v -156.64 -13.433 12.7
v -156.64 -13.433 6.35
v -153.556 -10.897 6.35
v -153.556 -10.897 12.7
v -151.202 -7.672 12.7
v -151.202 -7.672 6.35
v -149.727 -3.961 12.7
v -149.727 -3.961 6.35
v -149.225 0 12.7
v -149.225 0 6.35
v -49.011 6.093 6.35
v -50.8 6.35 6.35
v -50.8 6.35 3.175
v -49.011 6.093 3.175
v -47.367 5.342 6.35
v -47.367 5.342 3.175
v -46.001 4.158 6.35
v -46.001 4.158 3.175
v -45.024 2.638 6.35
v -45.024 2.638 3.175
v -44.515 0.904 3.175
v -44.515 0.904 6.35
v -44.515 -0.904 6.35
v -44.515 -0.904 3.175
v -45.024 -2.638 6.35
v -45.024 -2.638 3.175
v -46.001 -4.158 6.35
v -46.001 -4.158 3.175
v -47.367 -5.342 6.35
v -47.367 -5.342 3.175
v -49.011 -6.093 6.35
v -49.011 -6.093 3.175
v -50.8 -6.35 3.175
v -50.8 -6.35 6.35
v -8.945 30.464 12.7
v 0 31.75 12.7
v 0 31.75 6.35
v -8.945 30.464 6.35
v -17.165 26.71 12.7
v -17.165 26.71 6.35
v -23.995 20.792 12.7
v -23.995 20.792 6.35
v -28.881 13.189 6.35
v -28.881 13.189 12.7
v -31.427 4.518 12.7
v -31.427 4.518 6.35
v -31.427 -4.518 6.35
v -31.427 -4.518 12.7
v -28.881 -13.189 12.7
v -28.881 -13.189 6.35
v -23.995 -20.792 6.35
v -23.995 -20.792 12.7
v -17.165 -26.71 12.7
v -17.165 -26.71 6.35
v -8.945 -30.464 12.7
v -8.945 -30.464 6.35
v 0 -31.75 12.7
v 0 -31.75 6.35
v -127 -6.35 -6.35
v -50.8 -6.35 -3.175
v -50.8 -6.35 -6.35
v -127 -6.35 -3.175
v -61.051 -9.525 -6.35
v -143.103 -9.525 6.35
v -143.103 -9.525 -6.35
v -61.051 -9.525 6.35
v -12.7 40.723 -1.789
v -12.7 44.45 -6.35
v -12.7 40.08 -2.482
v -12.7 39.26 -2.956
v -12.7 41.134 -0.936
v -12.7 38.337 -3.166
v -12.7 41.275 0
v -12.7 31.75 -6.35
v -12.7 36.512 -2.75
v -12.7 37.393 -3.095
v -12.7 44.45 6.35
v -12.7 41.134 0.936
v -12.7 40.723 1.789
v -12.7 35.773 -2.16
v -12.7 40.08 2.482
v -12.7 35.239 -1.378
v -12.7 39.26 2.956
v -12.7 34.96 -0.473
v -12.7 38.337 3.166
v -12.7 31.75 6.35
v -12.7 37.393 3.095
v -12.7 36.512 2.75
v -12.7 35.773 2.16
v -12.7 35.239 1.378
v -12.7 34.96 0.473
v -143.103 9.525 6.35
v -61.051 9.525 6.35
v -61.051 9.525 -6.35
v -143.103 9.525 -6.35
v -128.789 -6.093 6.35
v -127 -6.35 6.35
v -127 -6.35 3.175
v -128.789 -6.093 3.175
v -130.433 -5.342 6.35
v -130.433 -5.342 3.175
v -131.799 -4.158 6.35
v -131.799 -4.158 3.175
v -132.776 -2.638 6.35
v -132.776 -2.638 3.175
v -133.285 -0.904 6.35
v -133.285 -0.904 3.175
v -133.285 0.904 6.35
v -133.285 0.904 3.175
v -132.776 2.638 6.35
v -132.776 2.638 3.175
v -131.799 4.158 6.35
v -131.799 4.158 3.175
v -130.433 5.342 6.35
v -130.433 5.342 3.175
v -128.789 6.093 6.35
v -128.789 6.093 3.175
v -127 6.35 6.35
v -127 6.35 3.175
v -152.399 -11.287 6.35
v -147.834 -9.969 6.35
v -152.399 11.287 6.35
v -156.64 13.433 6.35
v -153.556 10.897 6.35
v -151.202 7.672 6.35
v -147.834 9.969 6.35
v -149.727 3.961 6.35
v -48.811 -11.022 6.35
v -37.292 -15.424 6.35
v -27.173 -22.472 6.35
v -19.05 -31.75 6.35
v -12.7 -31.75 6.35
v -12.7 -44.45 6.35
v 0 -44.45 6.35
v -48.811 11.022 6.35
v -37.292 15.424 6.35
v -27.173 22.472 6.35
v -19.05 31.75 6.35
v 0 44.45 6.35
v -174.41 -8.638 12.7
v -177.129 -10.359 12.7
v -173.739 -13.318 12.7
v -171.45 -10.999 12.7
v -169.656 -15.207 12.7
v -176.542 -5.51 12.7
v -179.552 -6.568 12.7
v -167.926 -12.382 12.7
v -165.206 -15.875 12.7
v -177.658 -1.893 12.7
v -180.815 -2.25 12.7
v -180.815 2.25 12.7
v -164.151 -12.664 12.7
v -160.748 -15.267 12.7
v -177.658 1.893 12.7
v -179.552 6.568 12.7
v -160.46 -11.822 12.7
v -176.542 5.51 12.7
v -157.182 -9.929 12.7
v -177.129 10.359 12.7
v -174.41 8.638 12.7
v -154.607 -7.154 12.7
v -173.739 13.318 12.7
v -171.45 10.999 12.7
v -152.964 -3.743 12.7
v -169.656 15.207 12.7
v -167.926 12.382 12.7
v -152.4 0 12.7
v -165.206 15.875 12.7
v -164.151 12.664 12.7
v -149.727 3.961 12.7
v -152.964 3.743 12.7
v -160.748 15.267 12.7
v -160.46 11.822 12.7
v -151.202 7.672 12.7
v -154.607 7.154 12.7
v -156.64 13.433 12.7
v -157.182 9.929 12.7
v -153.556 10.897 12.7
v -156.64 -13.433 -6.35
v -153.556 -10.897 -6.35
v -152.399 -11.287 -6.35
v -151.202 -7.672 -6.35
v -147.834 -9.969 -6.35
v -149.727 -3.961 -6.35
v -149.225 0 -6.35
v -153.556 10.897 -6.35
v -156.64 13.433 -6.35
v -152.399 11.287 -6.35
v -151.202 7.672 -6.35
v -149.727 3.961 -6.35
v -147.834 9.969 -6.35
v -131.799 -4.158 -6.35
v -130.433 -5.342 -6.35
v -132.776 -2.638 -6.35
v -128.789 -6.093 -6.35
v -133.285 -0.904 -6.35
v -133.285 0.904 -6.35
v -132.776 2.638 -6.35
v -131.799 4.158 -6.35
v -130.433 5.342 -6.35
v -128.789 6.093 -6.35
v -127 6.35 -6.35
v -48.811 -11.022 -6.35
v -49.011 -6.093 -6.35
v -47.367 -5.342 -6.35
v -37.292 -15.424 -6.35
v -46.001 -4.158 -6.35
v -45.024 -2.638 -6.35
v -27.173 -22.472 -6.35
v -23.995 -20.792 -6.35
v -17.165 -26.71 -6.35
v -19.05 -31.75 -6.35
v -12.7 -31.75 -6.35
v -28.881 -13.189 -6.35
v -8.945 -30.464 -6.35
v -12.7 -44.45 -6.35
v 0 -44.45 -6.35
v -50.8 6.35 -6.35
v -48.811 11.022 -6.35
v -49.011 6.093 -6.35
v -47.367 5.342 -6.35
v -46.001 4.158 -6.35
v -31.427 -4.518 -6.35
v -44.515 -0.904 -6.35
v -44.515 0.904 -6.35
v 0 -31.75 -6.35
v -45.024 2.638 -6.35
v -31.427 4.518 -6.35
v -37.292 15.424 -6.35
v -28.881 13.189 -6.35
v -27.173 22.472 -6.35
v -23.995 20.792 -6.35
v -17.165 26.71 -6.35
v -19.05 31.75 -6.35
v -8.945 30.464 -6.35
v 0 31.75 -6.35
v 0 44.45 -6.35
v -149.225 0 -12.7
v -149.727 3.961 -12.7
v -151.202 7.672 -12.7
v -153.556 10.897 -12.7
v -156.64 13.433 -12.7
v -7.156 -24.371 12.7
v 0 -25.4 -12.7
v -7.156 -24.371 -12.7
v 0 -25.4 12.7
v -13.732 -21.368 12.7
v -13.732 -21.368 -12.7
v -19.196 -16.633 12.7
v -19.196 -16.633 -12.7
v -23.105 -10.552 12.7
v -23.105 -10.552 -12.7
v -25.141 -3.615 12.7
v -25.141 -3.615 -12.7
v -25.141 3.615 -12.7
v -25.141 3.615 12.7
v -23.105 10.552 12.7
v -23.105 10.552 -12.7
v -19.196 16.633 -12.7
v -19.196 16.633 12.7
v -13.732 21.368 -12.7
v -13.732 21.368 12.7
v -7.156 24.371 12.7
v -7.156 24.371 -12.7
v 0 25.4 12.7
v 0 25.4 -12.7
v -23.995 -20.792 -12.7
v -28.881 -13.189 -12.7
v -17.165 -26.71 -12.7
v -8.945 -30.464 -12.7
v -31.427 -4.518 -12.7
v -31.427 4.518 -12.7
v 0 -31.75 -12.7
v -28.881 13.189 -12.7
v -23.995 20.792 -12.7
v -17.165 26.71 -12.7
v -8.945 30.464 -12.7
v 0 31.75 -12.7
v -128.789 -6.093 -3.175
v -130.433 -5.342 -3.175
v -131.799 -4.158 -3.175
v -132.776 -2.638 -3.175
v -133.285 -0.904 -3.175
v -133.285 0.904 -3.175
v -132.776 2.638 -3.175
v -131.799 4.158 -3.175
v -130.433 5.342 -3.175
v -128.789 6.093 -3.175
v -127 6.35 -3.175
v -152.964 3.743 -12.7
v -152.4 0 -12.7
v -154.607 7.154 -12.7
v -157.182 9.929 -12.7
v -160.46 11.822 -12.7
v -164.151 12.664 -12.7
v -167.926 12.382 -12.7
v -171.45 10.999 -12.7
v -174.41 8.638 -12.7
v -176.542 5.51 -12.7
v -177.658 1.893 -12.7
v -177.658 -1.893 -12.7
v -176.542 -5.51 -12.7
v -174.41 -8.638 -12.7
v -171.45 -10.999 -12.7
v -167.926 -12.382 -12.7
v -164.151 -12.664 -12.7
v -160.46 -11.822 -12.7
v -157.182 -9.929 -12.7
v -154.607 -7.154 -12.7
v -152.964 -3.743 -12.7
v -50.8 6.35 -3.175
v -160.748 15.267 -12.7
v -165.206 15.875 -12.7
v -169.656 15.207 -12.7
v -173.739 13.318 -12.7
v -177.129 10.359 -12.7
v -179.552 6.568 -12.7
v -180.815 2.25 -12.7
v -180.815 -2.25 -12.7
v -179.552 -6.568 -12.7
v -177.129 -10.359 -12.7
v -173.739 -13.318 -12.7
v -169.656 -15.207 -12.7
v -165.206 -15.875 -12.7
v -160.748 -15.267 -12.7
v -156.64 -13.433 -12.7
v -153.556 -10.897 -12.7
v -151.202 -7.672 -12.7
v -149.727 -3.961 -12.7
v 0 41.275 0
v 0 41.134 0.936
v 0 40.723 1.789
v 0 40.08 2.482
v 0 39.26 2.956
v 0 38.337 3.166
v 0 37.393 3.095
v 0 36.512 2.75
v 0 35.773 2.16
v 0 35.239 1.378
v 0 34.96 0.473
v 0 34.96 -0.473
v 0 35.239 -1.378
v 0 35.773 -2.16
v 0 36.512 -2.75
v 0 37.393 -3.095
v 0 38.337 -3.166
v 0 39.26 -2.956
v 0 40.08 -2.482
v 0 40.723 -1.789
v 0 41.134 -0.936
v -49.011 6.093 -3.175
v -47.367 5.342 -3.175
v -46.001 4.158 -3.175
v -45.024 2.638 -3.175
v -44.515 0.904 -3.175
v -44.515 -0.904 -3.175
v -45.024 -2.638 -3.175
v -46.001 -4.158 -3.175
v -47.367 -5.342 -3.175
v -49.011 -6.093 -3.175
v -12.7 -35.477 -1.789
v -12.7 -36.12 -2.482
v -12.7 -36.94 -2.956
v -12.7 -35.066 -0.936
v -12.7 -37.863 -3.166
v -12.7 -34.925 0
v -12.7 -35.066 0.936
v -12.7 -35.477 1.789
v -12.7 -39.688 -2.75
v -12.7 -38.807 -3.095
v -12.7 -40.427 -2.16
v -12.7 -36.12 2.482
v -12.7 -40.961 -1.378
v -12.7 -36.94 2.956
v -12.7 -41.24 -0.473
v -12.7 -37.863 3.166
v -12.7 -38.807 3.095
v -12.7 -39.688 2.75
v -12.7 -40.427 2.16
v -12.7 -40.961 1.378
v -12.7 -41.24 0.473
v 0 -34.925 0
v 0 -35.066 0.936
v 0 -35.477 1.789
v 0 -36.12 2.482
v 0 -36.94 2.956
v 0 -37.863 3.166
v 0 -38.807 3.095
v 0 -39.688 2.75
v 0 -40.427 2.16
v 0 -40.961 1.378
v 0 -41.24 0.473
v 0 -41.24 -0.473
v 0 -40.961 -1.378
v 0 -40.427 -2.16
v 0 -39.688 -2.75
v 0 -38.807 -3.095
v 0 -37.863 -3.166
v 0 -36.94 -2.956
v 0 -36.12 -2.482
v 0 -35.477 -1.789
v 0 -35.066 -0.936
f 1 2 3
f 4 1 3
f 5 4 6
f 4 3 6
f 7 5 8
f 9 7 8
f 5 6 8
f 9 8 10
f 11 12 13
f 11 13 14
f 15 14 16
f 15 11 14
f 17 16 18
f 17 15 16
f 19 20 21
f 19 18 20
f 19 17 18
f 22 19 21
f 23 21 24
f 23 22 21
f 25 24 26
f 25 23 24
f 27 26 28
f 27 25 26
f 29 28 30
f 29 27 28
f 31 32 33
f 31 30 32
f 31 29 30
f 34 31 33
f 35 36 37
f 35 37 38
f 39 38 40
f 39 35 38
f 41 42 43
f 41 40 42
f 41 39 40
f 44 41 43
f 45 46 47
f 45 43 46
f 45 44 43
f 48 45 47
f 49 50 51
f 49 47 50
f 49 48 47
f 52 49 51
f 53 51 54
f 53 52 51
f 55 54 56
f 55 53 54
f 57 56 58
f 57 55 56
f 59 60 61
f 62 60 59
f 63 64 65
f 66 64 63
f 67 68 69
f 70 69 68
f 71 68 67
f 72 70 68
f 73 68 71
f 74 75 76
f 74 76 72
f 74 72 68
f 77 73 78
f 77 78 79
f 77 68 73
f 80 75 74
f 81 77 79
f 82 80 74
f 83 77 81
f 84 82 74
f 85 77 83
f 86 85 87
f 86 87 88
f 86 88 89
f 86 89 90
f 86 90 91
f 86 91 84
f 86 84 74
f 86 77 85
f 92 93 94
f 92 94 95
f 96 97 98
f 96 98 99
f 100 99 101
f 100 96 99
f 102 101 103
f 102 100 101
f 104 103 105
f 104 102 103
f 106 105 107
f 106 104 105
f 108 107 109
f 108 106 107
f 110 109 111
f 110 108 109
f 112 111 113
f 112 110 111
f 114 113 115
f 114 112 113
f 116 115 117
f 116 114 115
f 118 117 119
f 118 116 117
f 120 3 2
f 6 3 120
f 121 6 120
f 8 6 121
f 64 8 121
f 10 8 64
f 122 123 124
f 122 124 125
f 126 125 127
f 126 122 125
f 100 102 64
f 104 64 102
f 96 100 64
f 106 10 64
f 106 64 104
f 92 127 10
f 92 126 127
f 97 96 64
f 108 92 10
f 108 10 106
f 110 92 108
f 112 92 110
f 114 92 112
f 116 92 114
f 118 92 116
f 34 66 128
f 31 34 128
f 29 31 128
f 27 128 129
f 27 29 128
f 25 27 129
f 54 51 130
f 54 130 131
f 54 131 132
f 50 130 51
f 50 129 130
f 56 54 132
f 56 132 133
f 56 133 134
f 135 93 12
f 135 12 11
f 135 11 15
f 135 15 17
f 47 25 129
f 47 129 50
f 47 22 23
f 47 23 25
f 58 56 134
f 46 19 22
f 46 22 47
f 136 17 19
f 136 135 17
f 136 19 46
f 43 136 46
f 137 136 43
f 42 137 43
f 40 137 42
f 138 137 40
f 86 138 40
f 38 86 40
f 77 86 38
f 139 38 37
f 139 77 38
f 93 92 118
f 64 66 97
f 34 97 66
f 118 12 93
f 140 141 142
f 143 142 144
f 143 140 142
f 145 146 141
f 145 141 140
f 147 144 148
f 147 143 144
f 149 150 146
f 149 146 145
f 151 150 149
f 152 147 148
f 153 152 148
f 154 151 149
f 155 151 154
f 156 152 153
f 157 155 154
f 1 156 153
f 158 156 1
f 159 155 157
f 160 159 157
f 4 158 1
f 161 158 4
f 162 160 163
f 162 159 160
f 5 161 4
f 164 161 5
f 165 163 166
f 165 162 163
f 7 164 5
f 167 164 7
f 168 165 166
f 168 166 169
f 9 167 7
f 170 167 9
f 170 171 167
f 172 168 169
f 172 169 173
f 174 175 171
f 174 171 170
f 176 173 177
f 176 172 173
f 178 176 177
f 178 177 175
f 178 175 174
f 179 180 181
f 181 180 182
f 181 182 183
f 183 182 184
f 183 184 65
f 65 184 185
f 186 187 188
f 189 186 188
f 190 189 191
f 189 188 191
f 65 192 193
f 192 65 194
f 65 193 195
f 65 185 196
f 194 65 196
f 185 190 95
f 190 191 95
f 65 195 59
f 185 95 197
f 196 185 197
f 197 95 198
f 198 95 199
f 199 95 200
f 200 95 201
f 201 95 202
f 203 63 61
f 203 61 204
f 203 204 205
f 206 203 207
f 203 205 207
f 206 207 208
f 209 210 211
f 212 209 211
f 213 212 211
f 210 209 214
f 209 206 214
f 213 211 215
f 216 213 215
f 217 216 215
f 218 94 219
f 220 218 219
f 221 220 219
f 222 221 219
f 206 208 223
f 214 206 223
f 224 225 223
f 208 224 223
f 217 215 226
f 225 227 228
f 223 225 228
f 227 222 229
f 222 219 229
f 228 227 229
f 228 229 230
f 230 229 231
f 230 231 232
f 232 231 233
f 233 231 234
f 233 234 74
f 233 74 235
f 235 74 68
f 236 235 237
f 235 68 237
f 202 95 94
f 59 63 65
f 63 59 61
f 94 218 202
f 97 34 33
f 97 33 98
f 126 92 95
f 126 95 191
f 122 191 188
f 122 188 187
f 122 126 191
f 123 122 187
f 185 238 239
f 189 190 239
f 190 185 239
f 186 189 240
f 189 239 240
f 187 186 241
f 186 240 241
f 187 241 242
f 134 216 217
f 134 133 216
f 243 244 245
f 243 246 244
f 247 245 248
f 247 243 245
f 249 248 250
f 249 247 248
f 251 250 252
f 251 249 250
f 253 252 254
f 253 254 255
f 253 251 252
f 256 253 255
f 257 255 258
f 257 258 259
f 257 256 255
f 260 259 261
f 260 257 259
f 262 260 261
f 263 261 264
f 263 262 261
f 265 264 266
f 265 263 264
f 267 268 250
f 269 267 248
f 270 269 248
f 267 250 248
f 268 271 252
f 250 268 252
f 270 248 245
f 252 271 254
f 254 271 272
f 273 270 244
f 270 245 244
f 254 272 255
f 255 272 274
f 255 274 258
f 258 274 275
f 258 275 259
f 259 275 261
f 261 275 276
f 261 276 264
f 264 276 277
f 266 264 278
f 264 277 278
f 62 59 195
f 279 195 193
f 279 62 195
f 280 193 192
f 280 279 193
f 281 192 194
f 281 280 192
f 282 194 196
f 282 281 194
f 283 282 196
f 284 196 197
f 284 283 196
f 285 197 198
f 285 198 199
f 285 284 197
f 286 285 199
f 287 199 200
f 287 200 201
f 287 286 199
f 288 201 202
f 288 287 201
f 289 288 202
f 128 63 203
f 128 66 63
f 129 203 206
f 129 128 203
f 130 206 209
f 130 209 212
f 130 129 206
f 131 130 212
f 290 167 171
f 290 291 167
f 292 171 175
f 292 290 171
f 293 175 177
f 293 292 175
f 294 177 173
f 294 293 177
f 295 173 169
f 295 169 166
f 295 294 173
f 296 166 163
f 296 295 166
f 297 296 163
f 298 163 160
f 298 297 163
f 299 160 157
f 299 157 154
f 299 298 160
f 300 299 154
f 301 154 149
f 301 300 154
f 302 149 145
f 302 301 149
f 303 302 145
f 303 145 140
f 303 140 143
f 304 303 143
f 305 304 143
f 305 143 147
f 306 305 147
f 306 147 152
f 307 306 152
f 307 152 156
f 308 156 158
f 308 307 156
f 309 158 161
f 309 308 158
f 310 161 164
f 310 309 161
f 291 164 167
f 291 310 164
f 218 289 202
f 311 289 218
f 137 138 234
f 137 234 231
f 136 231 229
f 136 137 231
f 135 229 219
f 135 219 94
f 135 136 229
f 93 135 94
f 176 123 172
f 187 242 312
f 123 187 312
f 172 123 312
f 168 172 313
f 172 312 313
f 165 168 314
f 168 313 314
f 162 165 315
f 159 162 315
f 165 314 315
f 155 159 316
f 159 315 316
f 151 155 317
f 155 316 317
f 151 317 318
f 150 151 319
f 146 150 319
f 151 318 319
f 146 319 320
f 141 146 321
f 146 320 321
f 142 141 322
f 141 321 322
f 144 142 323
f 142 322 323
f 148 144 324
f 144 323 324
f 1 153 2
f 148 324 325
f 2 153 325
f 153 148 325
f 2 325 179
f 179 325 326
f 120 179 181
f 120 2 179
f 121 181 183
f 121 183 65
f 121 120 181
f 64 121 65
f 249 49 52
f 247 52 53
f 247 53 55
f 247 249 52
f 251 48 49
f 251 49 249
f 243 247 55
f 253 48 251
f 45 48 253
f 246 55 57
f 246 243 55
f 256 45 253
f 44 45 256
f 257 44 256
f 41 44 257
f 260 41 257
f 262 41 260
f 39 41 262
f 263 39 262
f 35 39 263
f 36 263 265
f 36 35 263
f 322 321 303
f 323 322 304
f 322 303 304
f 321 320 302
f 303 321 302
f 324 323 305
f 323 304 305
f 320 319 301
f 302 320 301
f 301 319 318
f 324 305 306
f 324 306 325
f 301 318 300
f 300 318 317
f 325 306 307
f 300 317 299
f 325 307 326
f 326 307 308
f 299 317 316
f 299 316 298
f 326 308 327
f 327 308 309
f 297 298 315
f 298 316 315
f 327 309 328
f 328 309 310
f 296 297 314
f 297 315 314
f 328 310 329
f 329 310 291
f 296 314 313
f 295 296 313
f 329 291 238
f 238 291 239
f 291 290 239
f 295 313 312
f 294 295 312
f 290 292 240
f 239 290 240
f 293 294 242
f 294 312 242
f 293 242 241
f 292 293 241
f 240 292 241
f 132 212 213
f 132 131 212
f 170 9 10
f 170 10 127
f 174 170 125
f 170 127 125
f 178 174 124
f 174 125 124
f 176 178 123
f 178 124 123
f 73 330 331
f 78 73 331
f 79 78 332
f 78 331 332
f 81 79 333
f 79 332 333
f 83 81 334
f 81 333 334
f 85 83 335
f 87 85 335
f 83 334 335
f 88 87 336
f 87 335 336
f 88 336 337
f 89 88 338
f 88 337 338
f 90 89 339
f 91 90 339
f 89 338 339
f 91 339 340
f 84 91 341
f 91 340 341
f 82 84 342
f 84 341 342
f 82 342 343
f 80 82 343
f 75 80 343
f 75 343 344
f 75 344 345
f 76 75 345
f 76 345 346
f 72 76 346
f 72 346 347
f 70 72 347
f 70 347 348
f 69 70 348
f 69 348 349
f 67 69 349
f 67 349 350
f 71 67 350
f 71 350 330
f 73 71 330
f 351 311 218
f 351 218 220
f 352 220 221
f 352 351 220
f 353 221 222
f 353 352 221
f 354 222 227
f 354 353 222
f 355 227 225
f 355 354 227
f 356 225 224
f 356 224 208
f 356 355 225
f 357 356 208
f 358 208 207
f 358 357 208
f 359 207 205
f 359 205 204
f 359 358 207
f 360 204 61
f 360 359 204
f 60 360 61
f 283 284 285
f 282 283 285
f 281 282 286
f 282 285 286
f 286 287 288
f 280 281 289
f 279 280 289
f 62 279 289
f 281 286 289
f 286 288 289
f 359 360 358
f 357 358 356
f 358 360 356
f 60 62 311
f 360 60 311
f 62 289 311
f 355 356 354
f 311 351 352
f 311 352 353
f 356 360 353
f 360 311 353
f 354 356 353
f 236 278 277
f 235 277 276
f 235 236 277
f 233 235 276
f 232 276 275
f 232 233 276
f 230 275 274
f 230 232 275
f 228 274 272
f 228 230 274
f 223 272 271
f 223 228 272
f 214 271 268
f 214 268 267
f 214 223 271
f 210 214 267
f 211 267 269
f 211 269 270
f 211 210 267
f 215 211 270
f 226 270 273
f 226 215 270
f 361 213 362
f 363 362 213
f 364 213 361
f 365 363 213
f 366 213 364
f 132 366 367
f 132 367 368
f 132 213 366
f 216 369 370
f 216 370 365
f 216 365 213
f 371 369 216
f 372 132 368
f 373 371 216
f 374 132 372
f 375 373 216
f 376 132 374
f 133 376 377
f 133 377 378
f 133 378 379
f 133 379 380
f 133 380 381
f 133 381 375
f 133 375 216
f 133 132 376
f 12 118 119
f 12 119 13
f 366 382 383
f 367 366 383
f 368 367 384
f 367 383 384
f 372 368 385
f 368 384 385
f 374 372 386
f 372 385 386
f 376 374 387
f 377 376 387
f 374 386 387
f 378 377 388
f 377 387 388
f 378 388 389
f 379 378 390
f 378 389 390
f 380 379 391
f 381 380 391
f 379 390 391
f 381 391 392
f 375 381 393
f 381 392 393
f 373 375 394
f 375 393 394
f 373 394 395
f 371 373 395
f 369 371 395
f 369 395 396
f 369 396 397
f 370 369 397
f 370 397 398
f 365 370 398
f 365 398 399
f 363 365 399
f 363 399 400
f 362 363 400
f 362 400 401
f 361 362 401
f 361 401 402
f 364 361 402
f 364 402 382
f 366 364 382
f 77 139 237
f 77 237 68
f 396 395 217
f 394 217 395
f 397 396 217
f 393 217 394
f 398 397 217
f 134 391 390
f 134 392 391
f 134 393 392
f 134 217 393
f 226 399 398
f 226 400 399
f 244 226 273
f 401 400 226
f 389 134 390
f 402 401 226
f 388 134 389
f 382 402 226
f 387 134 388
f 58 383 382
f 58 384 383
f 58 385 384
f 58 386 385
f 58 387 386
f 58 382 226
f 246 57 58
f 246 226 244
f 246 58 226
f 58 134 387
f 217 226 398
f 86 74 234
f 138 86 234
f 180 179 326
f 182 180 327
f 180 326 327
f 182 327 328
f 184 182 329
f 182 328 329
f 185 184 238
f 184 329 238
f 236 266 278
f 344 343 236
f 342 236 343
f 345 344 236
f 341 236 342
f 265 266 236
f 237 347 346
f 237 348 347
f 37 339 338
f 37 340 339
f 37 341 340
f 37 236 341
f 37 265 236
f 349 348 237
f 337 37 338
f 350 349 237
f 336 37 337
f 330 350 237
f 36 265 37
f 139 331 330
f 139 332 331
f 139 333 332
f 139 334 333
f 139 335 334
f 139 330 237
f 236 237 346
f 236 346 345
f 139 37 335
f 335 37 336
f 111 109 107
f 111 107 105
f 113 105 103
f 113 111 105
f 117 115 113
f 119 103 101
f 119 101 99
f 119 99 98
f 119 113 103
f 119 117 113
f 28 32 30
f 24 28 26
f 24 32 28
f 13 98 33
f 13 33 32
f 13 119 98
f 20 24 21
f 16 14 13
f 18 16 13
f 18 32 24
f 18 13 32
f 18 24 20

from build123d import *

# Parameters (mm, degrees)
F1_DEPTH = 6.35
F0_R     = 12.7
F2_DEPTH = 12.7
F3_DEPTH = 3.175
F4_R     = 3.175
F5_DEPTH = 180.976


with BuildPart() as f1:
    # F0 (on Top) → F1 (new body, symmetric)
    with BuildSketch(Plane.XY):
        with BuildLine():
            ThreePointArc((0, -31.75), (-31.75, 0), (0, 31.75))
            Line((0, 31.75), (0, 44.45))
            Line((0, 44.45), (-12.7, 44.45))
            Line((-12.7, 44.45), (-12.7, 31.75))
            Line((-12.7, 31.75), (-19.05, 31.75))
            ThreePointArc((-19.05, 31.75), (-37.291778, 15.423719), (-61.051302, 9.525))
            Line((-61.051302, 9.525), (-143.102955, 9.525))
            ThreePointArc((-143.102955, 9.525), (-150.147647, 10.521469), (-156.639598, 13.432692))
            ThreePointArc((-156.639598, 13.432692), (-151.201718, 7.671595), (-149.225, 0))
            ThreePointArc((-149.225, 0), (-151.201718, -7.671595), (-156.639598, -13.432692))
            ThreePointArc((-156.639598, -13.432692), (-150.147647, -10.521469), (-143.102955, -9.525))
            Line((-143.102955, -9.525), (-61.051302, -9.525))
            ThreePointArc((-61.051302, -9.525), (-37.291778, -15.423719), (-19.05, -31.75))
            Line((-19.05, -31.75), (-12.7, -31.75))
            Line((-12.7, -31.75), (-12.7, -44.45))
            Line((-12.7, -44.45), (0, -44.45))
            Line((0, -44.45), (0, -31.75))
        make_face()
        with BuildLine():
            ThreePointArc((-127, -6.35), (-133.35, 0), (-127, 6.35))
            Line((-127, 6.35), (-50.8, 6.35))
            ThreePointArc((-50.8, 6.35), (-44.45, 0), (-50.8, -6.35))
            Line((-50.8, -6.35), (-127, -6.35))
        make_face(mode=Mode.SUBTRACT)
    extrude(amount=F1_DEPTH, both=True)

    # F0 (on Top) → F2 (join, symmetric)
    with BuildSketch(Plane.XY):
        with BuildLine():
            ThreePointArc((-149.225, 0), (-151.201718, 7.671595), (-156.639598, 13.432692))
            ThreePointArc((-156.639598, 13.432692), (-180.975, 0), (-156.639598, -13.432692))
            ThreePointArc((-156.639598, -13.432692), (-151.201718, -7.671595), (-149.225, 0))
        make_face()
        with Locations((-165.1, 0)):
            Circle(F0_R, mode=Mode.SUBTRACT)
        with BuildLine():
            Line((0, 25.4), (0, 31.75))
            ThreePointArc((0, 31.75), (-31.75, 0), (0, -31.75))
            Line((0, -31.75), (0, -25.4))
            ThreePointArc((0, -25.4), (-25.4, 0), (0, 25.4))
        make_face()
    extrude(amount=F2_DEPTH, both=True)

    # F0 (on Top) → F3 (join, symmetric)
    with BuildSketch(Plane.XY):
        with BuildLine():
            Line((-50.8, 6.35), (-127, 6.35))
            ThreePointArc((-127, 6.35), (-133.35, 0), (-127, -6.35))
            Line((-127, -6.35), (-50.8, -6.35))
            ThreePointArc((-50.8, -6.35), (-44.45, 0), (-50.8, 6.35))
        make_face()
    extrude(amount=F3_DEPTH, both=True)

    # F4 (on face) → F5 (cut, through all)
    with BuildSketch(Plane.YZ):
        with Locations((-38.1, 0)):
            Circle(F4_R)
        with Locations((38.1, 0)):
            Circle(F4_R)
    extrude(amount=-F5_DEPTH, mode=Mode.SUBTRACT)


solid = f1.part
